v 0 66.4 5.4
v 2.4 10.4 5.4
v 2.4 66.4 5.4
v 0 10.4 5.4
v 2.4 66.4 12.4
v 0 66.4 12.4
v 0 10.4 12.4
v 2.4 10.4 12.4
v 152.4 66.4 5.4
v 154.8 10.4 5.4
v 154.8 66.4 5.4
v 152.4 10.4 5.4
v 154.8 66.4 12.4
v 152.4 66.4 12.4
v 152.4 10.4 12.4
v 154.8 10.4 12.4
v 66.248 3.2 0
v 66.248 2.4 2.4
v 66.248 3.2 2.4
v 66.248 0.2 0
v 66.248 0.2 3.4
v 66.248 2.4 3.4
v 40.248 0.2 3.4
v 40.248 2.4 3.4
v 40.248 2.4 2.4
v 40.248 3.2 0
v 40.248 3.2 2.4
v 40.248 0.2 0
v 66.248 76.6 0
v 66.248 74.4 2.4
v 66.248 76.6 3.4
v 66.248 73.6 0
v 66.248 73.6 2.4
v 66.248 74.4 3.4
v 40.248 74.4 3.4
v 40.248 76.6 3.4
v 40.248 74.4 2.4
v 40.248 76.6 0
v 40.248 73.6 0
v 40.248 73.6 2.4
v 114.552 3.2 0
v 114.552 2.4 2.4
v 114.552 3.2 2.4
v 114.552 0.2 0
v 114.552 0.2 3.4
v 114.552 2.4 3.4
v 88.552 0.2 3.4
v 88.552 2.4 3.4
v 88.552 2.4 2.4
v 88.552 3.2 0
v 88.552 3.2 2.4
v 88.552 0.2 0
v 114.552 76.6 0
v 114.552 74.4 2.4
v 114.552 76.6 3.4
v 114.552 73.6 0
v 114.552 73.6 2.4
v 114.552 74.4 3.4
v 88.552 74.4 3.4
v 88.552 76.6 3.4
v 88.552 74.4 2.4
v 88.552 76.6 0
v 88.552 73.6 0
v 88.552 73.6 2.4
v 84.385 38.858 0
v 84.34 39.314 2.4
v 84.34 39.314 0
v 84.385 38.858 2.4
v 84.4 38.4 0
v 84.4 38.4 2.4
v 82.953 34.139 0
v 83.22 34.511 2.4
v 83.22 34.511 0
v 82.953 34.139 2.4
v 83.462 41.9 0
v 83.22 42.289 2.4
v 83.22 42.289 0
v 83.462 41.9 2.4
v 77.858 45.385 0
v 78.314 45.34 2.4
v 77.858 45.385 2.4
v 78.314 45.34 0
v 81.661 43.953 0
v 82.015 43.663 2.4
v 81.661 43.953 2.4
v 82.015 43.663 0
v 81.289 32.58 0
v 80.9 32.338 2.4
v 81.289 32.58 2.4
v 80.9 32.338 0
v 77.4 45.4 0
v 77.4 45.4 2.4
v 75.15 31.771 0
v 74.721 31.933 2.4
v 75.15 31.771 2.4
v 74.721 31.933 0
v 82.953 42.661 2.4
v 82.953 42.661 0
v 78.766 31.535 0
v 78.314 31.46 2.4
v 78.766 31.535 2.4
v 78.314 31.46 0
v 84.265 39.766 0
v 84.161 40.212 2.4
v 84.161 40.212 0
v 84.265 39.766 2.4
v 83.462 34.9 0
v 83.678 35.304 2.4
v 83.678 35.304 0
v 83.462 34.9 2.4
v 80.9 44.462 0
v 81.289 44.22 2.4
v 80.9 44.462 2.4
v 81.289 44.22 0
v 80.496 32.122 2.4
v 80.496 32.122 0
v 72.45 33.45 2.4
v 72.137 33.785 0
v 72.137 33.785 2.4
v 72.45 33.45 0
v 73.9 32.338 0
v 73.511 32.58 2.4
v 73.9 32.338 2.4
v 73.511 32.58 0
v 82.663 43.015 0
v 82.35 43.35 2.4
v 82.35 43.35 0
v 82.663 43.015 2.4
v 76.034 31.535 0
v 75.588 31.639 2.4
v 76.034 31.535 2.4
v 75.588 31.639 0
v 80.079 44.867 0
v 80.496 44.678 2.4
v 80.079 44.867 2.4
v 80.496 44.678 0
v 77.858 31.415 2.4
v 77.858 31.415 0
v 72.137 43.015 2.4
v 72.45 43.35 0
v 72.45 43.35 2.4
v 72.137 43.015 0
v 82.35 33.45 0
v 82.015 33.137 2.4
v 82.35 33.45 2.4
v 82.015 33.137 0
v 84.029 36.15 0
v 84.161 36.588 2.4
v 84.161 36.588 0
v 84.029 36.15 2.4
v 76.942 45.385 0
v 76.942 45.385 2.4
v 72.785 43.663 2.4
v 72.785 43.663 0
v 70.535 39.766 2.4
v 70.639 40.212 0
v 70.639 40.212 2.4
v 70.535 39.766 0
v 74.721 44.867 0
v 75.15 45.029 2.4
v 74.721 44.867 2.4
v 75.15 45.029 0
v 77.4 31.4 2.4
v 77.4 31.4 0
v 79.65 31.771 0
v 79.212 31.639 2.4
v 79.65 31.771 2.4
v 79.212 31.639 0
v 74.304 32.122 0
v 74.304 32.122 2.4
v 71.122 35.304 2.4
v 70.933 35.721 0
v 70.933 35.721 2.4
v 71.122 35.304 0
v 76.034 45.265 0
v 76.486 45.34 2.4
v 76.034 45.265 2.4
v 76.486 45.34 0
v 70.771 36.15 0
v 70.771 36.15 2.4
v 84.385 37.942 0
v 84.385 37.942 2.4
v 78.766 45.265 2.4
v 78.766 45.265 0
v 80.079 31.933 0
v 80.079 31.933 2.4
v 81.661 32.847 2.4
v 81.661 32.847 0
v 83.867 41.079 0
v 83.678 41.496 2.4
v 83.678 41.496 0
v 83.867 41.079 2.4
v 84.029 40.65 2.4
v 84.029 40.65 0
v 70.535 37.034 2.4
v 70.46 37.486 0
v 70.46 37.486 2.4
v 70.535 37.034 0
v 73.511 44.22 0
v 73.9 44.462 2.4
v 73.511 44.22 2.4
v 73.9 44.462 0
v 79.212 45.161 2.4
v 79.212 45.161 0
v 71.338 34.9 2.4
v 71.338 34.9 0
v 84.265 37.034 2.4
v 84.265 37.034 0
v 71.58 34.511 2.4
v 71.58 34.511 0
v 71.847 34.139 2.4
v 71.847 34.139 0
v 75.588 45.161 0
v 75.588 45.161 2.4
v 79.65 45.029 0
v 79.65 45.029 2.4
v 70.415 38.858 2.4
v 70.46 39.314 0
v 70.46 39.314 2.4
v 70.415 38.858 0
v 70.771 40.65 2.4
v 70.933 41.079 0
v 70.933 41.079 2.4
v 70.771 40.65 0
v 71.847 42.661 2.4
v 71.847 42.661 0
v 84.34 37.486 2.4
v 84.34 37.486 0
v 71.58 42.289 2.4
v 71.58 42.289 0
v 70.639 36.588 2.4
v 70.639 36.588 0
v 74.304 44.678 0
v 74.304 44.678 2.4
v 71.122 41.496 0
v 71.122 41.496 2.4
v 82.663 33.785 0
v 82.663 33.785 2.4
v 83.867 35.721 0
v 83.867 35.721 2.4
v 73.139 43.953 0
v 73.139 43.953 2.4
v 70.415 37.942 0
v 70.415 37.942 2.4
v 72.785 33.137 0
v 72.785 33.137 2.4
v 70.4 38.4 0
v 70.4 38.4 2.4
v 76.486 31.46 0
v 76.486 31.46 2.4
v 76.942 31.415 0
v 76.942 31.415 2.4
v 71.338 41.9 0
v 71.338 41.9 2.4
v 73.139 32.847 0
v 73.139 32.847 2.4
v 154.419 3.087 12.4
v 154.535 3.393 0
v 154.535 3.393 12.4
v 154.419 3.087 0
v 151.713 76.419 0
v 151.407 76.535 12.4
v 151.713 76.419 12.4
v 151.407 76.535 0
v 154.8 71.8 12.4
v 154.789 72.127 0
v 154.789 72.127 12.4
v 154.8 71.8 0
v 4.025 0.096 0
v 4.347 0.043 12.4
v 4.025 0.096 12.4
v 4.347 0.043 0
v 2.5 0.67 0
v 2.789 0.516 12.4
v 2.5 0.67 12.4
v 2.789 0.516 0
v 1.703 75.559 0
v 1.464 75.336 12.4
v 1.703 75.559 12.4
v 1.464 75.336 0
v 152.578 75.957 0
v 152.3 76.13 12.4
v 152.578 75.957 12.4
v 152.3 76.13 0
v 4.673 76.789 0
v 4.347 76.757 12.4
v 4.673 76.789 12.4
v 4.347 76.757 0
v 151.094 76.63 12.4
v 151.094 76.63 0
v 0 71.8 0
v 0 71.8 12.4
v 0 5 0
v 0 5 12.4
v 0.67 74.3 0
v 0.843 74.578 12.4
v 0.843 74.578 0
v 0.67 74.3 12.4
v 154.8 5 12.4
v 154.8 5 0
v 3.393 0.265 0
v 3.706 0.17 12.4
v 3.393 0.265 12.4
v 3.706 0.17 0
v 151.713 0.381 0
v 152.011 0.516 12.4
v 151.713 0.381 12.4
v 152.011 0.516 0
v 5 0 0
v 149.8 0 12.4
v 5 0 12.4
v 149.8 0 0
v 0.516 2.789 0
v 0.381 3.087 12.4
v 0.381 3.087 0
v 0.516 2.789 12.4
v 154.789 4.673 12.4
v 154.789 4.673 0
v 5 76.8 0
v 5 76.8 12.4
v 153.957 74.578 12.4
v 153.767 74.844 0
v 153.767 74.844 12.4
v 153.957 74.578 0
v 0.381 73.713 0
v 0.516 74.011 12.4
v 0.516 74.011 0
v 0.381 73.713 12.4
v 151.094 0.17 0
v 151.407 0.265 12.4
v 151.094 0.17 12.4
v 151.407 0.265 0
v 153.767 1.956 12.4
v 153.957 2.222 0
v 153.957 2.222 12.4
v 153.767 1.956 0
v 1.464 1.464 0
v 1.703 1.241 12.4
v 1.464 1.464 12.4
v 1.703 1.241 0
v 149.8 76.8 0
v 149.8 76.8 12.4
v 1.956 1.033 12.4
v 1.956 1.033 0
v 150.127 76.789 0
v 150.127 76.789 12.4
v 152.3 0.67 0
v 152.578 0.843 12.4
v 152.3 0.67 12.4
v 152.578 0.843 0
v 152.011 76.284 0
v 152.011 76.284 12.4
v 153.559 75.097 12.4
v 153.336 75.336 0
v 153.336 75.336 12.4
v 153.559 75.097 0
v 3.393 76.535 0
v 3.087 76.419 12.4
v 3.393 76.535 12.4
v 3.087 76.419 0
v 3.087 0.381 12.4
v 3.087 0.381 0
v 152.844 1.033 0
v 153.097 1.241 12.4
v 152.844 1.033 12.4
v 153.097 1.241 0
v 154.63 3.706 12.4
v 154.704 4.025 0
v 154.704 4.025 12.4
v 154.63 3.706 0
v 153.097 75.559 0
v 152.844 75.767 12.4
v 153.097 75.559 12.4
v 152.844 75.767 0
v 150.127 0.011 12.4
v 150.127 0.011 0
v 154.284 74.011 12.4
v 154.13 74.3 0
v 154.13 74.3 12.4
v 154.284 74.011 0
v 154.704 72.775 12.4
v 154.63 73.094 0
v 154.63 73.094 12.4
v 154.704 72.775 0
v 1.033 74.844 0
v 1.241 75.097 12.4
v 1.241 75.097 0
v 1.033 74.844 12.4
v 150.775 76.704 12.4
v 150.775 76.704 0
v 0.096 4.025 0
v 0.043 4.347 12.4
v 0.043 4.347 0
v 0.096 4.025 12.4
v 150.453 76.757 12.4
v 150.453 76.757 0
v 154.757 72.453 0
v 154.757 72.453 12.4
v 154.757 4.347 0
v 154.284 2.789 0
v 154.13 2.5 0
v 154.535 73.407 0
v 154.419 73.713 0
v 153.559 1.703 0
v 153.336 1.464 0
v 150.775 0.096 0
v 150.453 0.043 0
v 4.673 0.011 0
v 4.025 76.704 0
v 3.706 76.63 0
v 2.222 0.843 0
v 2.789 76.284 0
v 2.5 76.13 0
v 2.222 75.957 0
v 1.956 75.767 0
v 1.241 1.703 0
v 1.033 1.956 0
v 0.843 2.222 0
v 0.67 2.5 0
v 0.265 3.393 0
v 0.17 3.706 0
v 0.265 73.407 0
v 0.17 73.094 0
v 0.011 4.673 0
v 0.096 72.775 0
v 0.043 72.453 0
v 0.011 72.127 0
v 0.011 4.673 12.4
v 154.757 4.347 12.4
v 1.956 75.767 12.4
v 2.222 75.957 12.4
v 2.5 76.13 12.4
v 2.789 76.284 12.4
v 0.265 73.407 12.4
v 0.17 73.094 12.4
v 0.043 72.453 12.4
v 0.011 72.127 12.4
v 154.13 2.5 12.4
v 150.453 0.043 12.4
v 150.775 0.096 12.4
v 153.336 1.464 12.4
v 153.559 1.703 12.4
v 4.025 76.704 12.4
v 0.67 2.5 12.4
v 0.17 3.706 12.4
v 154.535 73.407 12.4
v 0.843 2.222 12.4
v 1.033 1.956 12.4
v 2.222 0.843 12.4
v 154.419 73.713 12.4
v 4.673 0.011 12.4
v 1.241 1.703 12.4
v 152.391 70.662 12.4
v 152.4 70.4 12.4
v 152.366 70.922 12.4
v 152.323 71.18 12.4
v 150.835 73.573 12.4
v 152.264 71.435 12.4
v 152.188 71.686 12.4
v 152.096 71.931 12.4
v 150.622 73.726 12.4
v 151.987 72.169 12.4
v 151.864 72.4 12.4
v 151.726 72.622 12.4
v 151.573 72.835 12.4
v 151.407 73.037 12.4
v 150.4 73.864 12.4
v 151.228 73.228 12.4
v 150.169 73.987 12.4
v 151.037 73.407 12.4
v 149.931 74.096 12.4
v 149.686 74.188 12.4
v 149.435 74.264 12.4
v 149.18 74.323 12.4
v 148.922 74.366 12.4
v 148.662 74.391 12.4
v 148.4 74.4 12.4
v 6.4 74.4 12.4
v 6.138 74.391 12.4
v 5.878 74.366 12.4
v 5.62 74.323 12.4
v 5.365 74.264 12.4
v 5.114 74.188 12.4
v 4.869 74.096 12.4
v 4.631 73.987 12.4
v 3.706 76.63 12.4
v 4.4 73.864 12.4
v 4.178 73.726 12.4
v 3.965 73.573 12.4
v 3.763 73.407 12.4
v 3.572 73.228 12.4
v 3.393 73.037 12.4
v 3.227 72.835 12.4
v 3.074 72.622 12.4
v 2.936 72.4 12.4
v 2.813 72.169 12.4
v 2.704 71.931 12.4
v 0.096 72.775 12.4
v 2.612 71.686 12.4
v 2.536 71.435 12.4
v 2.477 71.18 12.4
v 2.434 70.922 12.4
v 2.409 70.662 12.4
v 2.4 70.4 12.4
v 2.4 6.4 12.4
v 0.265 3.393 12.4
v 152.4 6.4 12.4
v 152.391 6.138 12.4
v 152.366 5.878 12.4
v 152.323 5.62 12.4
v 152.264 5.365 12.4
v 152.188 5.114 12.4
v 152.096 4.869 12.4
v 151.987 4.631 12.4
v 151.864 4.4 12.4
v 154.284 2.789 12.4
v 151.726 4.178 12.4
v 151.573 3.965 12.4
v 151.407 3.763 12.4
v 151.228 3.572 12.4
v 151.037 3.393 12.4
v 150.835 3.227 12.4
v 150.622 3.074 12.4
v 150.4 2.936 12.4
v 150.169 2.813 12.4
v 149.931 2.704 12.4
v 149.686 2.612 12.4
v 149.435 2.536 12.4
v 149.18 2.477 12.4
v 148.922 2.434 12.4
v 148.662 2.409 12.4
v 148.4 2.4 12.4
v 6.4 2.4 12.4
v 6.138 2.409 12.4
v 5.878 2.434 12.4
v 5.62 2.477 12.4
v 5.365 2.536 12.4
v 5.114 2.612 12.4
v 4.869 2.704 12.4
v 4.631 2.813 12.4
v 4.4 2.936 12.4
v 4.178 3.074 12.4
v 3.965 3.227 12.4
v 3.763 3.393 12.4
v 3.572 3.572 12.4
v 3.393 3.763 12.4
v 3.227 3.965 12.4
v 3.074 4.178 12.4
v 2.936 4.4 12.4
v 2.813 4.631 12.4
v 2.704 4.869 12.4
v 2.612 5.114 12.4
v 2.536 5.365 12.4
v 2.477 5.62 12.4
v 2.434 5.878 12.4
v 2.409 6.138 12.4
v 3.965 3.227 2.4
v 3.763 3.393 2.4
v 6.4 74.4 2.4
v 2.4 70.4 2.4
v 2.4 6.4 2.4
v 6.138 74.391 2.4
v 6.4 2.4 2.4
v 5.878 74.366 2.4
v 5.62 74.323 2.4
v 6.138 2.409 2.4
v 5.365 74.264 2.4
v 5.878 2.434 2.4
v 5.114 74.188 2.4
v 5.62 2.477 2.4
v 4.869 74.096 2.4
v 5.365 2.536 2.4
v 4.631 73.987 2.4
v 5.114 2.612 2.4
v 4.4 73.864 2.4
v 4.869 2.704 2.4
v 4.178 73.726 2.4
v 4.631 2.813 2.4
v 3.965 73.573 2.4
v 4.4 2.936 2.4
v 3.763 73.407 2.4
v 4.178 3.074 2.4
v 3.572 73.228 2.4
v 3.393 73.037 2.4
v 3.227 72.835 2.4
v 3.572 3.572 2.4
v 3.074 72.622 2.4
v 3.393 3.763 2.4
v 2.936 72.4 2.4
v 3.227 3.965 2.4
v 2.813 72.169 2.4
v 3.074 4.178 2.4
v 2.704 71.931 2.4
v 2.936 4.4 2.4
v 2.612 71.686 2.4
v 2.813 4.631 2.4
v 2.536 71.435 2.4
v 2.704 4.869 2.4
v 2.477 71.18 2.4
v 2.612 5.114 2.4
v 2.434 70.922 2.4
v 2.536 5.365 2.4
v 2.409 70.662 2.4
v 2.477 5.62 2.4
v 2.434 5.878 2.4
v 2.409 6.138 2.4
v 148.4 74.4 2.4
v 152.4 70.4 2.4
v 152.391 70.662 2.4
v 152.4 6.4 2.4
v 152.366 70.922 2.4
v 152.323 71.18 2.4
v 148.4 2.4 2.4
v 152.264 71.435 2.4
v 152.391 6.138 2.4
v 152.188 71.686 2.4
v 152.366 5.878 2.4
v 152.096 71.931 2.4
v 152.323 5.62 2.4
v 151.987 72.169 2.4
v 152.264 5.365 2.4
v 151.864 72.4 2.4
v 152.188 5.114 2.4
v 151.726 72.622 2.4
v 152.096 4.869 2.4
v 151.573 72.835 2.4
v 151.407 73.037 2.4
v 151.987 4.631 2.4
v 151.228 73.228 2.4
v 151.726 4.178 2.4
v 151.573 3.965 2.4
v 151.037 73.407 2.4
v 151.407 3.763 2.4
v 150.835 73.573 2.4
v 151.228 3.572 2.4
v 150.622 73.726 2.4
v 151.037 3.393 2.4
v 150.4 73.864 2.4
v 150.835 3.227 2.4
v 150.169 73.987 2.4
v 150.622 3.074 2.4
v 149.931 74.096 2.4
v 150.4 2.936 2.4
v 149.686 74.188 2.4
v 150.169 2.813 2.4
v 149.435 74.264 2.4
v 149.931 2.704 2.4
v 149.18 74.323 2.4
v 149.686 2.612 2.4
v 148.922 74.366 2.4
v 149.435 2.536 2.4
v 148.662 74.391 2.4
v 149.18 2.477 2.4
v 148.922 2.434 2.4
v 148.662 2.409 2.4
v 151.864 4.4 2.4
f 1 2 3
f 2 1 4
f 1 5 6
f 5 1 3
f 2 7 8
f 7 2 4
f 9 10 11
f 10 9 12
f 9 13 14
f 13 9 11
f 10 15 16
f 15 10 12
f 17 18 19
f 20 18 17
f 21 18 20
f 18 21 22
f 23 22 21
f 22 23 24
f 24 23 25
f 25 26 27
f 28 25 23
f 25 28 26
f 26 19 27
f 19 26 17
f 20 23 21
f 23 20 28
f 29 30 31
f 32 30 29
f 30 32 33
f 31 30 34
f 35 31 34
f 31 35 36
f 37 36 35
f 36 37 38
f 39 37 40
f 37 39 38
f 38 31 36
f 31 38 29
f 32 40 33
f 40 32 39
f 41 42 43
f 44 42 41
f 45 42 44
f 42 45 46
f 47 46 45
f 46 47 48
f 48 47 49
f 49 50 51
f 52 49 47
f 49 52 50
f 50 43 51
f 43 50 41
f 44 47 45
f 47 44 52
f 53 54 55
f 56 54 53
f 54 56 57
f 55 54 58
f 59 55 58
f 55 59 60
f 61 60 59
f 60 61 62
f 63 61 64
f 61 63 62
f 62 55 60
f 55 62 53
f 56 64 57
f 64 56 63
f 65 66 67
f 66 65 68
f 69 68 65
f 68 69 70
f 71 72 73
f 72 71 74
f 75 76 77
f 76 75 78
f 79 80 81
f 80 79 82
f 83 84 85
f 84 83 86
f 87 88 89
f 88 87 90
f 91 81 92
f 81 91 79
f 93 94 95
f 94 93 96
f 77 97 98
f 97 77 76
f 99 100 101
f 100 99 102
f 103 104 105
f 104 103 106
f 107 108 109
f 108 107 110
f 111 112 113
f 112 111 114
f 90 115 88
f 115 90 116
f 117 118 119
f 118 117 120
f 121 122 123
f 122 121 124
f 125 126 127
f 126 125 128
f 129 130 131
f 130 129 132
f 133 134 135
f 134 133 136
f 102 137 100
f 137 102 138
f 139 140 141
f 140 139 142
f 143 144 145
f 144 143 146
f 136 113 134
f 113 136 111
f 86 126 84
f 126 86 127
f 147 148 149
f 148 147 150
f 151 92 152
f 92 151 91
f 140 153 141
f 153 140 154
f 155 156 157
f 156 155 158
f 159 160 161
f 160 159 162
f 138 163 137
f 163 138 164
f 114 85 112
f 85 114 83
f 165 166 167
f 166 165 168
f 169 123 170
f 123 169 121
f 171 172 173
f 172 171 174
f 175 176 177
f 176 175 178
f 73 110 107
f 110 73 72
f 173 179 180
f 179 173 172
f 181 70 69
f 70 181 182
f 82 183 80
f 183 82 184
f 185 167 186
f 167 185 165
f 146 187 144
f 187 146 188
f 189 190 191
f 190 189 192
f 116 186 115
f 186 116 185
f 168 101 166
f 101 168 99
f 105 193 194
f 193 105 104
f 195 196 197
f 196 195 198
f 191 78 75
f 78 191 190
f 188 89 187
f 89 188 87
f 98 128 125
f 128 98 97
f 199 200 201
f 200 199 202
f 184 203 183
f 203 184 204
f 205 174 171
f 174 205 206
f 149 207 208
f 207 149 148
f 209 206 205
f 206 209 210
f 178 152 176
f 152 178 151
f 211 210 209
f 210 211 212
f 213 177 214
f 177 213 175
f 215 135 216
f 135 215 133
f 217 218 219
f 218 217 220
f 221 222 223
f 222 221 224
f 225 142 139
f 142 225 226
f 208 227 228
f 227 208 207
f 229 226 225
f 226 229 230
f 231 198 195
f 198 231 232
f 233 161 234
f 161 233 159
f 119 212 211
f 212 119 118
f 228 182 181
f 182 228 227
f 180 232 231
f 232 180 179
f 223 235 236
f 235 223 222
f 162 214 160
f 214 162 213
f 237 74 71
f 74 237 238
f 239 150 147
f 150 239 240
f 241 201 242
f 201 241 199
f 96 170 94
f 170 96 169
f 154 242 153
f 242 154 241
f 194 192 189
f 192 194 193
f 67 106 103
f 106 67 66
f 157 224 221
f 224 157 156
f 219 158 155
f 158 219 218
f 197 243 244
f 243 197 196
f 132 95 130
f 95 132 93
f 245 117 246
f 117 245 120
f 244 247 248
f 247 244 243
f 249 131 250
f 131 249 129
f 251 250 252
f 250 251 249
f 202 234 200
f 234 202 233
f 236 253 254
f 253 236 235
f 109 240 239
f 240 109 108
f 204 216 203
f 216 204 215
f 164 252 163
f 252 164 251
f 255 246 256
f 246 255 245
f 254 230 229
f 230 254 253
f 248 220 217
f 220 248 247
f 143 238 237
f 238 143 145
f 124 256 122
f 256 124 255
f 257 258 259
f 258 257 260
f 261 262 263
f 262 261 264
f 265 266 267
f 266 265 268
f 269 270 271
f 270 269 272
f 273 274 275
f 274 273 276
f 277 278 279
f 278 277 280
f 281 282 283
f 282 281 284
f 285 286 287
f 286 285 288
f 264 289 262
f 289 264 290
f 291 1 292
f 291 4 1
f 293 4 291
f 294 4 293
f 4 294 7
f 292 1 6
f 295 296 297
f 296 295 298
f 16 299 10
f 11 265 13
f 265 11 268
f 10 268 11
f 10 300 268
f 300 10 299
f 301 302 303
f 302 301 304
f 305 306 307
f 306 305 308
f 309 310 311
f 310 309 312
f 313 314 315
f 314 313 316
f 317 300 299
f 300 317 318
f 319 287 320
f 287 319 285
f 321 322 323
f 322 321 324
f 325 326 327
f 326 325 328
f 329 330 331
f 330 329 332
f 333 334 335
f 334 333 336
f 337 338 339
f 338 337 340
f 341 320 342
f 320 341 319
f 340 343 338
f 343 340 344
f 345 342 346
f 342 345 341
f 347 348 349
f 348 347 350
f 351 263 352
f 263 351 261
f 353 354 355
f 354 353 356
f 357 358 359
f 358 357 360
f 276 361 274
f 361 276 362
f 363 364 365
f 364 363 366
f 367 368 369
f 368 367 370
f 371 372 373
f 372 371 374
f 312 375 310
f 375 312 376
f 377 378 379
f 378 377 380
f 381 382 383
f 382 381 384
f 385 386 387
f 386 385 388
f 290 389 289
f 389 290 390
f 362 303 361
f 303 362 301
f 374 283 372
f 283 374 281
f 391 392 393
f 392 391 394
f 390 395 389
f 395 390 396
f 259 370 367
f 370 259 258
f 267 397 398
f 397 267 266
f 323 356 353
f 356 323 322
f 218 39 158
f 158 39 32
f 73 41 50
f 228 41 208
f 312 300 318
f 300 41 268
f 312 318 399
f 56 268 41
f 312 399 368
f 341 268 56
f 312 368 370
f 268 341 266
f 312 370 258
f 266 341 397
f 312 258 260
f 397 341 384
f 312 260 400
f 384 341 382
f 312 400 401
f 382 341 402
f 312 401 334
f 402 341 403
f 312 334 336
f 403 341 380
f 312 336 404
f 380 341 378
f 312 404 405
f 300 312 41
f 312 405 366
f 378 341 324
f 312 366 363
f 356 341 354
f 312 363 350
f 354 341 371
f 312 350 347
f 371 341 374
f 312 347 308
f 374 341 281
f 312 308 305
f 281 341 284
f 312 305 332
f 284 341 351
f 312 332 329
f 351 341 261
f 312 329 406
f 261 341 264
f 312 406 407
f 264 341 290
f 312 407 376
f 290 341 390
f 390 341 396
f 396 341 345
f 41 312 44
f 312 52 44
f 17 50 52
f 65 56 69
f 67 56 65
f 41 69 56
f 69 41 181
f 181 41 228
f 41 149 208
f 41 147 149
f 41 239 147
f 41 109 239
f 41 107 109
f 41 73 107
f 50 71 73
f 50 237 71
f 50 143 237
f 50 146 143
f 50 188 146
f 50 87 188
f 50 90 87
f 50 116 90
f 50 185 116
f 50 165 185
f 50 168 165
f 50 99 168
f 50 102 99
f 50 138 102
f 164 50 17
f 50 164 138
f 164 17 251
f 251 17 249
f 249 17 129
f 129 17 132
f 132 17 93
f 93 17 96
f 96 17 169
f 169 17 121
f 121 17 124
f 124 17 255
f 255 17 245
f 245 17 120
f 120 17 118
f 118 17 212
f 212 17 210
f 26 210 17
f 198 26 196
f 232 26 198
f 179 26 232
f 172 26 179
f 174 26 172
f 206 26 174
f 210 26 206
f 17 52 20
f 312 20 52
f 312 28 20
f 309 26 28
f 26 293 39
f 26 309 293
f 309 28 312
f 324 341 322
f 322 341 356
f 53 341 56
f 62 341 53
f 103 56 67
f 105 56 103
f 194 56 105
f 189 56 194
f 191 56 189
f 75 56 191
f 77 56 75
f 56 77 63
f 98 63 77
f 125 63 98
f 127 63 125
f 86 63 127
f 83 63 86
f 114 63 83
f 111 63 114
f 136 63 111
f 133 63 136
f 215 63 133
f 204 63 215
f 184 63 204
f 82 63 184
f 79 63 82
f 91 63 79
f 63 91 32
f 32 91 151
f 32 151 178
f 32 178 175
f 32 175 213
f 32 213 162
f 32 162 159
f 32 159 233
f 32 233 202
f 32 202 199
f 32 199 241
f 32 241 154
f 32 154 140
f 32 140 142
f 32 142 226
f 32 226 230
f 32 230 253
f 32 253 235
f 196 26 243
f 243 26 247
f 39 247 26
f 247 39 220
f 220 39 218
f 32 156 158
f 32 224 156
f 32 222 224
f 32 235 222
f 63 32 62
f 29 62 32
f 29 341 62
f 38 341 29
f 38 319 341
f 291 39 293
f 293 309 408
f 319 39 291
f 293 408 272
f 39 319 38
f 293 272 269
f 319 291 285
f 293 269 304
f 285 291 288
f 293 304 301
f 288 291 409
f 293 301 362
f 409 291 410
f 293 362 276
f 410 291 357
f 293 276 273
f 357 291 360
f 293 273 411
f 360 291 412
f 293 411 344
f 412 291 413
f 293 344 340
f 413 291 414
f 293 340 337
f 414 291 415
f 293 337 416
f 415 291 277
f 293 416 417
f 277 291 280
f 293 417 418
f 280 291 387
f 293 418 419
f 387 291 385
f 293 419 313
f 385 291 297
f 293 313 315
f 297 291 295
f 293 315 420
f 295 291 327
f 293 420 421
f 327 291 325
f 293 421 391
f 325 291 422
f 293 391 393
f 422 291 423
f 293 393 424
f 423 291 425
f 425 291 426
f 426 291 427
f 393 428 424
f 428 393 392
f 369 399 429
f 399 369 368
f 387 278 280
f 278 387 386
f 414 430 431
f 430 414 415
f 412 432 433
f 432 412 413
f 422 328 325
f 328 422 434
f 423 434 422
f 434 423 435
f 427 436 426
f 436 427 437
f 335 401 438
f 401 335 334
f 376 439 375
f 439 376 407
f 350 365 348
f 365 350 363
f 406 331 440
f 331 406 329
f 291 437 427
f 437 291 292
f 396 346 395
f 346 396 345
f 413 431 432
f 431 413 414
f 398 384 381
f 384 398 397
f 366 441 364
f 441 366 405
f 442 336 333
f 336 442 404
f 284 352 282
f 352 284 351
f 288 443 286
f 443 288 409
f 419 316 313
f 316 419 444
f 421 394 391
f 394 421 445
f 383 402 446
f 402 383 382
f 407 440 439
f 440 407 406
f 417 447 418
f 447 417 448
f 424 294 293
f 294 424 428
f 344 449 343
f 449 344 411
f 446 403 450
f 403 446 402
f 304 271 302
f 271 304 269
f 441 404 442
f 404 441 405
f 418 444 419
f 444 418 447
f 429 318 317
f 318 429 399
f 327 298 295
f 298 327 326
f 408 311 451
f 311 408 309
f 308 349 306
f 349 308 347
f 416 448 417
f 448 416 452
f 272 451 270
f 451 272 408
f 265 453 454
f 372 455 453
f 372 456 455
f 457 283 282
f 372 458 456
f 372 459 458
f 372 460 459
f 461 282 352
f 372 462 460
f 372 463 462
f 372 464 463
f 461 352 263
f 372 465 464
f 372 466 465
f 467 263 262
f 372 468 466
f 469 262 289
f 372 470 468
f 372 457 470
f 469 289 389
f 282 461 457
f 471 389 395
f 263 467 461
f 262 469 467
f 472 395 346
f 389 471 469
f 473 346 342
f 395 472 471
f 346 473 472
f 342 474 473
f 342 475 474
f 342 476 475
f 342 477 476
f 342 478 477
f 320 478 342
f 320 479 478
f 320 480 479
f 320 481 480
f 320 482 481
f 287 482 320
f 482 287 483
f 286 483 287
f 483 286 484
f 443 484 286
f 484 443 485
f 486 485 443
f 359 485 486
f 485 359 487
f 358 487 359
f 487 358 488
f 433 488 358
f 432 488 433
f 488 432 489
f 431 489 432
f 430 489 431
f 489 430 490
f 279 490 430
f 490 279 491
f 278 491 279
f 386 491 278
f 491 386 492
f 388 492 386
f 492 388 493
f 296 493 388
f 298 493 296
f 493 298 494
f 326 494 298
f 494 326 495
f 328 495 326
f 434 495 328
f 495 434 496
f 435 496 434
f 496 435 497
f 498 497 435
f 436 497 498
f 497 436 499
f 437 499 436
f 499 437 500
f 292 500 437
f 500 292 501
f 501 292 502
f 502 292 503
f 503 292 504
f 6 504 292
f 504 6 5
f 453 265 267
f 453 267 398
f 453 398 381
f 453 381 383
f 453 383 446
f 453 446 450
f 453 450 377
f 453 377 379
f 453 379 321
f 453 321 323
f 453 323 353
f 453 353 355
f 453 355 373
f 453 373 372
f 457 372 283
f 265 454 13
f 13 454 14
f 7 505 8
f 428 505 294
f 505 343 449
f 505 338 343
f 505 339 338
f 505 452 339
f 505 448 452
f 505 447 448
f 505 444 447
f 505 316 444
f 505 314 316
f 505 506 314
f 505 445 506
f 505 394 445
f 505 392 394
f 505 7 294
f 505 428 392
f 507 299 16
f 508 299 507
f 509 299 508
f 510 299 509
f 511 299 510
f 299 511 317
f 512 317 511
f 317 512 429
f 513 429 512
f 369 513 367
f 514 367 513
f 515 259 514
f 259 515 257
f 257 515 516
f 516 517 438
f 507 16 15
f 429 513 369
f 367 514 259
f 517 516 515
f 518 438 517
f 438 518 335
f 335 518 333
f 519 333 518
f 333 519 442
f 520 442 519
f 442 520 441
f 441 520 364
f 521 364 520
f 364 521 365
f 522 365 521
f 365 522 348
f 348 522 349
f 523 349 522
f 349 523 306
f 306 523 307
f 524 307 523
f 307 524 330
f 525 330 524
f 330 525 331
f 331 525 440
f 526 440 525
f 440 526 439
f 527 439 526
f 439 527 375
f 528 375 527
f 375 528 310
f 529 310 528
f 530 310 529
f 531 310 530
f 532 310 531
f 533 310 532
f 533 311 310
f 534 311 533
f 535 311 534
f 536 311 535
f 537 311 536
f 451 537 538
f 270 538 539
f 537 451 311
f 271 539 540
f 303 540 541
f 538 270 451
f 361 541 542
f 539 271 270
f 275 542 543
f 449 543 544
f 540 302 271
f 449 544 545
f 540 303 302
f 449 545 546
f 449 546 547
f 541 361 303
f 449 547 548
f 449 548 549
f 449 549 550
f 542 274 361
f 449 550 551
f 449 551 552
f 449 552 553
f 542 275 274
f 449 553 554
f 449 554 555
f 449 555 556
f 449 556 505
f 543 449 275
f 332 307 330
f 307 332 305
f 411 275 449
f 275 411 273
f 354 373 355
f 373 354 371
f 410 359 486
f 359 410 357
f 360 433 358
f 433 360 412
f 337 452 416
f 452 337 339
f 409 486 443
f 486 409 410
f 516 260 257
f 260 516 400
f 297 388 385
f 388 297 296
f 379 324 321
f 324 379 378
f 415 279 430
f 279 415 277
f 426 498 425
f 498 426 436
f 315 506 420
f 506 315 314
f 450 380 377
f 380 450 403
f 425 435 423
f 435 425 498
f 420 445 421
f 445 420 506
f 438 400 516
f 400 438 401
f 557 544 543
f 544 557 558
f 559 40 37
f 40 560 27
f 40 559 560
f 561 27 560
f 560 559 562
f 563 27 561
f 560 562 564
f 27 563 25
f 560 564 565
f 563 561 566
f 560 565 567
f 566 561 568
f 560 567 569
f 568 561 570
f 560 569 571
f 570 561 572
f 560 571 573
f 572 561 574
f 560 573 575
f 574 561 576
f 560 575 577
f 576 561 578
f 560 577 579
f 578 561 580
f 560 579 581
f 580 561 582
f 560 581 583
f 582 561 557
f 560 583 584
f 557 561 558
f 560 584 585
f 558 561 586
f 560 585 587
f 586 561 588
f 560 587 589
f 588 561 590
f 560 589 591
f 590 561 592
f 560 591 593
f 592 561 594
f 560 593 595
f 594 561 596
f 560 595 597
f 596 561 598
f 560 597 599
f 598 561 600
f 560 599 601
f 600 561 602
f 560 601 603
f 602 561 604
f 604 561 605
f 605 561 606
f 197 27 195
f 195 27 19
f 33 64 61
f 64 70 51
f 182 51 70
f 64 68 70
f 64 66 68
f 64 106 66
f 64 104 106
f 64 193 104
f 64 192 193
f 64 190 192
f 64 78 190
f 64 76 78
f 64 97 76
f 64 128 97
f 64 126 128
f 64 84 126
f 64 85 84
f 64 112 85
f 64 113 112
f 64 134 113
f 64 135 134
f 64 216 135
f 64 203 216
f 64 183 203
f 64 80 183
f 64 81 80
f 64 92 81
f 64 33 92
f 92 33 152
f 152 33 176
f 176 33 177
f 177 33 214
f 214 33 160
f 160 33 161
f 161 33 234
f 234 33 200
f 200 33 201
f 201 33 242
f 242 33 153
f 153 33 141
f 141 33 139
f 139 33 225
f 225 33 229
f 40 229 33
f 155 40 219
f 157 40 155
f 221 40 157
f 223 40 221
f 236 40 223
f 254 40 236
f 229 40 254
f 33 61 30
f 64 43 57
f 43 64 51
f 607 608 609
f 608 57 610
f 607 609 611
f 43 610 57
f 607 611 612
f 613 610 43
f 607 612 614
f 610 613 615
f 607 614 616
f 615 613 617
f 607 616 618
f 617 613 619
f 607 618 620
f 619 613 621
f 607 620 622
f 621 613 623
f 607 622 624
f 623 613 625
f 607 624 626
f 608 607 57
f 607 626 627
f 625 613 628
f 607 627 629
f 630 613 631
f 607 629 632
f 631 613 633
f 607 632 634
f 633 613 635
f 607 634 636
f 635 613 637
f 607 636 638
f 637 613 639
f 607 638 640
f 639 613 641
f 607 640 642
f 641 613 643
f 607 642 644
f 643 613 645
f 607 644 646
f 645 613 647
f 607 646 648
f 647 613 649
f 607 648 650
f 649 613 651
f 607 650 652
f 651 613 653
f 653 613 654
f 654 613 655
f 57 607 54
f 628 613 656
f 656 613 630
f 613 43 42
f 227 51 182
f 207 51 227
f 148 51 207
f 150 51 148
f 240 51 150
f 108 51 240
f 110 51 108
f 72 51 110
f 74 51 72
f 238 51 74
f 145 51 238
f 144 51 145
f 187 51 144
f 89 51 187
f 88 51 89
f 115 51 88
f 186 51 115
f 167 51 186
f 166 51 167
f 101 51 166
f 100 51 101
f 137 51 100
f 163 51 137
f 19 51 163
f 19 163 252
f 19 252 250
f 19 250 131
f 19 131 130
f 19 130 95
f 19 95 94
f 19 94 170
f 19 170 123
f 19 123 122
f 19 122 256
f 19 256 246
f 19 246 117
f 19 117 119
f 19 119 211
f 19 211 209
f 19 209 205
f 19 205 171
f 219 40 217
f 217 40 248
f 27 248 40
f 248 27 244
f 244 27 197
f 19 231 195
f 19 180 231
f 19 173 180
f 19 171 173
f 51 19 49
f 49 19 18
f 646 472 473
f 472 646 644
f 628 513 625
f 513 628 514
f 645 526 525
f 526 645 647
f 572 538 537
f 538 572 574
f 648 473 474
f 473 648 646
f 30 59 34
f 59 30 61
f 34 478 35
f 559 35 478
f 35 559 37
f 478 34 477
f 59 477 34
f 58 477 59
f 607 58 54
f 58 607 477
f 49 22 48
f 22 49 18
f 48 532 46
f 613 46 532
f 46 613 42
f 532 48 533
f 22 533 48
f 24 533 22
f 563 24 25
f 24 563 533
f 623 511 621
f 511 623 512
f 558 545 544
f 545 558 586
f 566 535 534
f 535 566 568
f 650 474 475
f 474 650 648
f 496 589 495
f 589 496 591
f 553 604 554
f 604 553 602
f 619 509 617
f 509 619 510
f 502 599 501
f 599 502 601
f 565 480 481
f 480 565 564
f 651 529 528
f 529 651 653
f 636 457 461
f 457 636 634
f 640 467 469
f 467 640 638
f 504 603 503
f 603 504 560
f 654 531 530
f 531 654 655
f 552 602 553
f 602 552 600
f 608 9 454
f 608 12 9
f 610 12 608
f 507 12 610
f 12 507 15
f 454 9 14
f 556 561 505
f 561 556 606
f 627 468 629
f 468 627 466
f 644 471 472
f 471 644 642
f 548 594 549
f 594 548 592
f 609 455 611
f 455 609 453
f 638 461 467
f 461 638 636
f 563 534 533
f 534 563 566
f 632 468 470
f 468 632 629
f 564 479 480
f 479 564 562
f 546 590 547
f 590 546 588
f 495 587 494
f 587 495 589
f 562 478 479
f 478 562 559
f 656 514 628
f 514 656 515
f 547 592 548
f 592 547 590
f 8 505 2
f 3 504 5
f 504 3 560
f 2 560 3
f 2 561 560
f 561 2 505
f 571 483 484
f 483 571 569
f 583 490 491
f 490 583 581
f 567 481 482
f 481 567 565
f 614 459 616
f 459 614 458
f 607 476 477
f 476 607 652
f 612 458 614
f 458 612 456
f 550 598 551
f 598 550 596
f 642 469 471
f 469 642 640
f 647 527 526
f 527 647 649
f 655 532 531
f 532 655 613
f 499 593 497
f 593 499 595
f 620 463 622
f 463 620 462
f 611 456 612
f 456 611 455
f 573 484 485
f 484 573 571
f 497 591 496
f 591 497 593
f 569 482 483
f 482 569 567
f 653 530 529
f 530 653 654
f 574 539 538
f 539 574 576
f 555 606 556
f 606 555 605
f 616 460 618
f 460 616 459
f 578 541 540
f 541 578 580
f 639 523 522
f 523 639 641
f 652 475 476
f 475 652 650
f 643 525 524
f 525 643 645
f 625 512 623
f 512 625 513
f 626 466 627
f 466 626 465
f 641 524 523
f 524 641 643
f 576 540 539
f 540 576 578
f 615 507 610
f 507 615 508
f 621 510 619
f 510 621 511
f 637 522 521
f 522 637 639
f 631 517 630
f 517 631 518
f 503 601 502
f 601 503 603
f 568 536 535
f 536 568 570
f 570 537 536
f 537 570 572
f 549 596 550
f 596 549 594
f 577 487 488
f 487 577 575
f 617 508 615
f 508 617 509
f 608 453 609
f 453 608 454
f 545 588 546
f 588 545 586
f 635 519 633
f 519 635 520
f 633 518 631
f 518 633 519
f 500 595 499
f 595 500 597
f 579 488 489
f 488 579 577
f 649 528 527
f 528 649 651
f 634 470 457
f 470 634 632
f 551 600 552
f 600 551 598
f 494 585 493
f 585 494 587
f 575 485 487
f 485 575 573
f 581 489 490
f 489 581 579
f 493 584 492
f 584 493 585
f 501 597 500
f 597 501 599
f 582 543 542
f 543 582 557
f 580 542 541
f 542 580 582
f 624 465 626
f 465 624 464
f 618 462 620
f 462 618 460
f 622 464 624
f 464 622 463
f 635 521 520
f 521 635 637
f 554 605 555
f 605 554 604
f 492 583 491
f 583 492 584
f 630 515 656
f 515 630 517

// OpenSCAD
// file: config.scad
// SportCam — shared parametric dimensions (mm).
// Every part file includes this; tweak here, re-render, everything stays consistent.
//
// This is the **PTZ-base build**: the camera, pan and tilt all come from the
// Arducam IMX477 PTZ camera with metal pan-tilt base (B0167B12), which bolts
// to the lid of a static enclosure. There is no pan stage, slip ring or
// tilt tower to print — see docs/02-hardware-mechanical.md.

$fn = 96;
clr = 0.25;                    // general printed-fit clearance per side

// ---- enclosure -------------------------------------------------------------
// Holds the Pi 5 (85 × 56) flat on standoffs, the 5 V distribution and the
// LED ring. The lid carries the Arducam pan-tilt base.
base_d        = 135;           // outer diameter — the Pi plus the power boards
                               // need this much floor; see base_housing.scad
base_h        = 66;            // floor to lid underside
base_wall     = 3;
lid_t         = 5;             // lid is structural: it carries the whole camera
led_window_h  = 12;            // circumferential LED slot
led_window_z  = 20;

jack_d        = 8.2;           // 5 V barrel jack, panel mount
// Tripod socket: a 3/8-16 brass insert, which takes a 3/8-16 tripod screw
// directly and a 1/4-20 one through a removable 3/8→1/4 reducer bushing —
// so it fits every photo and video tripod. The boss is 8 mm tall because
// the Pi sits 6 mm above the floor over it: use an insert no longer than
// that (or file one down).
tripod_boss_d = 24;
tripod_boss_h = 8;
tripod_hole_d = 12.7;          // MEASURE YOUR INSERT: epoxied, so a snug slip fit

pi_l = 85; pi_w = 56;          // Raspberry Pi 5
pi_hole_dx = 58; pi_hole_dy = 49;
pi_standoff_h = 6;
pi_x_off      = -10;           // Pi sits off-centre, leaving the +X side for power

// ---- Arducam pan-tilt base interface ---------------------------------------
// MEASURE YOURS. Arducam publishes no drawing for the B0167B12 metal base and
// the footprint has changed between revisions, so the lid is cut with **slots**
// spanning the range below rather than fixed holes. If your base's bolt
// spacing falls outside it, edit these two numbers and re-render.
ptz_bolt_min  = 30;            // narrowest bolt spacing the slots accept
ptz_bolt_max  = 72;            // widest
ptz_slot_w    = 3.4;           // M3 clearance
ptz_cable_d   = 34;            // central opening: CSI ribbon + servo leads drop through

// ---- UWB anchor arms (now static) ------------------------------------------
// The anchors no longer rotate with the camera, so the arms bolt to the
// enclosure wall. Board centres land `uwb_half_base` either side of the pan
// axis; the tracker subtracts the commanded pan angle (docs/04).
uwb_half_base = 125;           // half the baseline → 250 mm anchor separation
arm_w = 18; arm_t = 8;
arm_root_h = 24;               // bracket height where the arm meets the wall
arm_insert_d = 4.0;            // M3 heat-set inserts in the arm root
uwb_l = 40; uwb_w = 25;        // Haorutech ULA1 board — MEASURE YOURS
uwb_hole_dx = 32; uwb_hole_dy = 17;               // corner holes — MEASURE YOURS
                               // The ULA1's USB-A plug sticks out past uwb_l;
                               // the pad is cut long enough to clear it.

arm_boss_r = base_d / 2 + 4;  // outer face of the wall boss the arm bolts to
arm_len = uwb_half_base - arm_boss_r;             // boss face to board centre

// ---- third anchor mast (A3) ------------------------------------------------
// A3 gives elevation, which the horizontal A1-A2 bar cannot. It stands on a
// bought ½-inch hardwood dowel held in a printed foot on a third wall boss at
// −X — directly behind the lens, where pan (±80°) never points it — with a
// printed cradle carrying the board at the top. Wood, not metal: a metal
// tube right under a UWB antenna detunes it.
anchor_board_z = 22;           // A1/A2 board height above the enclosure floor
uwb_v_base  = 250;             // A3 board this far above A1/A2 (= σφ baseline)
mast_d      = 12.7;            // ½" dowel — MEASURE YOURS, they run ±0.3 mm
mast_wall   = 4;               // socket wall
mast_floor  = 2;               // closed socket bottom; sets the dowel's height
mast_foot_h = 44;              // foot socket depth: long, so the mast stands still
mast_cap_h  = 30;              // cradle socket depth
mast_bore   = mast_d + 2 * clr;
mast_sock_r = mast_bore / 2 + mast_wall;

// mast axis from the pan axis: boss face, 6 mm root plate, socket, 2 mm overlap.
// device/sportcam/config.py UWB_A3_BACK_M must match (in metres).
mast_axis_r = arm_boss_r + 6 + mast_sock_r - 2;
// The cradle puts the board mast_floor + arm_t + 4 above the dowel top
// (socket floor, pad, standoffs), and the foot's floor sits on the boss at
// z = 10, so cut the dowel to this:
cradle_rise  = mast_floor + arm_t + 4;
mast_dowel_l = anchor_board_z + uwb_v_base - cradle_rise - (10 + mast_floor);

// ---- battery tray ----------------------------------------------------------
// Sized to a 25 000 mAh USB-C PD power bank. MEASURE YOURS — banks of the
// same capacity vary by 15 mm in every direction. The tray straps to a tripod
// leg or centre column, or sandwiches under the enclosure on a long 1/4-20
// (into the reducer bushing).
bank_l = 150; bank_w = 72; bank_h = 30;
tray_wall = 2.4;
tray_lip = 10;                 // how far the side walls come up the bank
tray_strap_w = 26;             // hook-and-loop strap slots

// ---- wearable pod ----------------------------------------------------------
// The ULA1 is 5 V USB with no battery connector, so the tag is the module
// plugged into a small USB power bank rather than a board over a LiPo. Both
// lie side by side; measure your bank, they vary a lot.
bank_tag_l = 95; bank_tag_w = 23; bank_tag_h = 23;     // "lipstick" 2500 mAh
pod_inner_l = bank_tag_l + 5;
pod_inner_w = bank_tag_w + uwb_w + 4;
pod_inner_h = max(bank_tag_h, 12) + 2;
pod_wall = 2.0;
strap_w = 26;                  // elastic armband width
// main file
// Battery tray — carries the USB-C power bank low on the tripod.
//
// Two ways to mount it, both cut into the same part:
//   * strap it to a tripod leg or centre column through the two slots, or
//   * sandwich it between the tripod plate and the enclosure using a long
//     1/4-20 through the central bore, into the enclosure's reducer bushing.
//
// Keeping the heaviest single item at the bottom is what stops the rig being
// tippy once the anchor arms and the mast are bolted on.
include <config.scad>

ol = bank_l + 2 * tray_wall;
ow = bank_w + 2 * tray_wall;

module rbox(l, w, h, rad) {
    hull() for (x = [rad, l - rad], y = [rad, w - rad])
        translate([x, y, 0]) cylinder(r = rad, h = h);
}

module battery_tray() {
    difference() {
        rbox(ol, ow, tray_wall + tray_lip, 5);
        // bank pocket
        translate([tray_wall, tray_wall, tray_wall])
            rbox(bank_l, bank_w, tray_lip + 1, 4);
        // open the ends so a USB cable can leave either side
        for (x = [-1, ol - tray_wall - 1])
            translate([x, tray_wall + 8, tray_wall + 3])
                cube([tray_wall + 2, bank_w - 16, tray_lip]);
        // strap slots through the floor, either side of the pocket
        for (x = [ol * 0.26, ol * 0.74 - tray_strap_w])
            for (y = [tray_wall / 2 - 1, ow - tray_wall / 2 - 2])
                translate([x, y, -1]) cube([tray_strap_w, 3, tray_wall + 2]);
        // central 1/4-20 bore + counterbore for the bolt head
        translate([ol / 2, ow / 2, -1]) {
            cylinder(d = 7, h = tray_wall + 2);
            cylinder(d = 14, h = 4);
        }
    }
}

battery_tray();
